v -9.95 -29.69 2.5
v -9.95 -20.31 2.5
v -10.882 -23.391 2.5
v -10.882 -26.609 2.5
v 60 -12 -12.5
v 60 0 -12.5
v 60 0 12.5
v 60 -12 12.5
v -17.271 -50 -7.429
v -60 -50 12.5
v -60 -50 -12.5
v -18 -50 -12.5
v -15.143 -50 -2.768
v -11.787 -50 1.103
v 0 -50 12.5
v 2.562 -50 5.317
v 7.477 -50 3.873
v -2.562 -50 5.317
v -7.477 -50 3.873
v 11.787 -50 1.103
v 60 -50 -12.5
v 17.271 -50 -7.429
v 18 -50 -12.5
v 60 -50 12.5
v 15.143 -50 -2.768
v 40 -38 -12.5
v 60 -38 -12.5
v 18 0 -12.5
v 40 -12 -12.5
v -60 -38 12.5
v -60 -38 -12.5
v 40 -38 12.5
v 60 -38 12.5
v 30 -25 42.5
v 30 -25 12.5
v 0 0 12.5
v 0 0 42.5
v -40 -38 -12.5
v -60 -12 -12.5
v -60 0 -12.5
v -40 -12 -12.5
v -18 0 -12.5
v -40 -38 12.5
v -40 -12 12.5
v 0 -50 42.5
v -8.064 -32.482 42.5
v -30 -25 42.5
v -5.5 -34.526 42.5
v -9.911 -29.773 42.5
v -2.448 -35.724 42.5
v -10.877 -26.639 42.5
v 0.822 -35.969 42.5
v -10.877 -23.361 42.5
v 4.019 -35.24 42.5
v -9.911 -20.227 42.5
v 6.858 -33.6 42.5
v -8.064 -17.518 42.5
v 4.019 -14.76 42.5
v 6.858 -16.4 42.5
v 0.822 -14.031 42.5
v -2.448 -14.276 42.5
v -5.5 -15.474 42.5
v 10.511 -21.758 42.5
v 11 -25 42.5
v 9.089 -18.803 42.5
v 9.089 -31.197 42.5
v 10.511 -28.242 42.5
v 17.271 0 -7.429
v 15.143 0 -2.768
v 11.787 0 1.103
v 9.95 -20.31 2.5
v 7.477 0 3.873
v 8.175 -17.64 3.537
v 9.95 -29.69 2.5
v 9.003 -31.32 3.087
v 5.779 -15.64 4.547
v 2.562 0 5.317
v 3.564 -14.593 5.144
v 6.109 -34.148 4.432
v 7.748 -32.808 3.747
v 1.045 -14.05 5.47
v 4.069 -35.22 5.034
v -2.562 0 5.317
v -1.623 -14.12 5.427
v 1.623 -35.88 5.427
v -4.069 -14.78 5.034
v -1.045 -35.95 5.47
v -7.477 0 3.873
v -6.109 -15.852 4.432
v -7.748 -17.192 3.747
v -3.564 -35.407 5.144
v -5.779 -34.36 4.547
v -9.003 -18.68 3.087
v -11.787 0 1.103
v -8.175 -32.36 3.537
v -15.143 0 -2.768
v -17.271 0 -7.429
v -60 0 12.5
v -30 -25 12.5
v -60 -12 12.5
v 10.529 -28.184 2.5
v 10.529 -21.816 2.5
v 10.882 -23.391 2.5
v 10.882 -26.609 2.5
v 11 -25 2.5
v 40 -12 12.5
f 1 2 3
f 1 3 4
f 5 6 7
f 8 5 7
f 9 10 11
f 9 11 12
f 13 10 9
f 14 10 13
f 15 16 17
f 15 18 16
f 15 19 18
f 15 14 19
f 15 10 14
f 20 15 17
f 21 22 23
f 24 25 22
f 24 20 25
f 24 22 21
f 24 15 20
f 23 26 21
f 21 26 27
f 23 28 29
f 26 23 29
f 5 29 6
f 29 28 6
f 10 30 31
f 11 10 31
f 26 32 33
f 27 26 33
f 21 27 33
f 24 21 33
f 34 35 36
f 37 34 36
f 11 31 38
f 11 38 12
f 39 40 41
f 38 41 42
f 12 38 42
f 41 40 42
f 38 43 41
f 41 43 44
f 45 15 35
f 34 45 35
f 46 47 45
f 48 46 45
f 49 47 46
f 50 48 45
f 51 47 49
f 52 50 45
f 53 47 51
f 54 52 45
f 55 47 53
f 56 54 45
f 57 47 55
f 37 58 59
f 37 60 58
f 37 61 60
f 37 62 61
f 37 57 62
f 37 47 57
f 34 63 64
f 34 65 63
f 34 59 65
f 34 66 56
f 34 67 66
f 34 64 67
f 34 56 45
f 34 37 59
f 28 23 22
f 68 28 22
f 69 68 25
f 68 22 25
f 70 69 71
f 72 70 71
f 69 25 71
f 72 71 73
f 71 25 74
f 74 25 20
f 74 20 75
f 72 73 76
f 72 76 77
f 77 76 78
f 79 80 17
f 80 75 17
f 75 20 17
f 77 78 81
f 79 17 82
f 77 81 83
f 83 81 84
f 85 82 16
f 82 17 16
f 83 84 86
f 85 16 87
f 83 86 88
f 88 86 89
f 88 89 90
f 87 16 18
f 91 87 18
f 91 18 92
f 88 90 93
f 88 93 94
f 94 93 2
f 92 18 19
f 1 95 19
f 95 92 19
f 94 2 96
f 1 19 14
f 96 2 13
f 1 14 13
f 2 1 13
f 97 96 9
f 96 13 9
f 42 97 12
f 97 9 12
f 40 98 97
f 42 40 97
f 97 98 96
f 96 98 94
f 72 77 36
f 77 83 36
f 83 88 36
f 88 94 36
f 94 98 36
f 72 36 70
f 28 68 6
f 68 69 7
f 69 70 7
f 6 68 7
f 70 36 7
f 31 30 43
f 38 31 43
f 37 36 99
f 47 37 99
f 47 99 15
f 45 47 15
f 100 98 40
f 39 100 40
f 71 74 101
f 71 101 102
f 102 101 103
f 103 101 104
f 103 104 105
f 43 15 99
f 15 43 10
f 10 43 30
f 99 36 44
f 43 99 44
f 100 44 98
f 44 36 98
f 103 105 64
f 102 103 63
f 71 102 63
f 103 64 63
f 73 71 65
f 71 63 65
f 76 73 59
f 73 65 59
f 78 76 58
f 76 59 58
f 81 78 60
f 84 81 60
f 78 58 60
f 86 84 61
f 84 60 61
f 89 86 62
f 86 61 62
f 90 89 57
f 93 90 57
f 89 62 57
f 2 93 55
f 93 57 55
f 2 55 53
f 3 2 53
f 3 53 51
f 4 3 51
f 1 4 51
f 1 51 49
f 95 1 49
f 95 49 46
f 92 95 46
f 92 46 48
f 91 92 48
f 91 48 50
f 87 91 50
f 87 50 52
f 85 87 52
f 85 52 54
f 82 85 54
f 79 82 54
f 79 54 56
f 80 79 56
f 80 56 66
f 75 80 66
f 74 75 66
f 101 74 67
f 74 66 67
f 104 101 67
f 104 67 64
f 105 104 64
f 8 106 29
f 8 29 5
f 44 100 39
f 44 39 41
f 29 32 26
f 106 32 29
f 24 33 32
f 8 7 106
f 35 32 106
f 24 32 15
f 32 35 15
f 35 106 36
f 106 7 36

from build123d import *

# Parameters (mm, degrees)
F1_DEPTH = 50
F2_R     = 18
F3_DEPTH = 60
F4_W     = 40
F4_H     = 26
F5_DEPTH = 25
F7_DEPTH = 30
F8_R     = 11
F9_DEPTH = 40


# Not quite as in the source:
# - a feature names something its author has since deleted; it is built from what else it names


with BuildPart() as f1:
    # F0 (on Front) → F1 (new body)
    with BuildSketch(Plane.XZ):
        Polygon((-60, 12.5), (-60, -12.5), (60, -12.5), (60, 12.5), (30, 12.5), (-30, 12.5), align=None)
    extrude(amount=F1_DEPTH)

    # F2 (on face) → F3 (cut)
    with BuildSketch(Plane.XZ.offset(50)):
        with Locations((0, -12.5)):
            Circle(F2_R)
    extrude(amount=-F3_DEPTH, mode=Mode.SUBTRACT)

    # F4 (on face) → F5 (cut)
    with BuildSketch(Plane.XY.offset(12.5)):
        with Locations((-60, -25)):
            Rectangle(F4_W, F4_H)
        with Locations((60, -25)):
            Rectangle(F4_W, F4_H)
    extrude(amount=-F5_DEPTH, mode=Mode.SUBTRACT)

    # F6 (on face) → F7 (join)
    with BuildSketch(Plane.XY.offset(12.5)):
        Polygon((30, -25), (0, 0), (-30, -25), (0, -50), align=None)
    extrude(amount=F7_DEPTH)

    # F8 (on face) → F9 (cut)
    with BuildSketch(Plane.XY.offset(42.5)):
        with Locations((0, -25)):
            Circle(F8_R)
    extrude(amount=-F9_DEPTH, mode=Mode.SUBTRACT)


solid = f1.part
